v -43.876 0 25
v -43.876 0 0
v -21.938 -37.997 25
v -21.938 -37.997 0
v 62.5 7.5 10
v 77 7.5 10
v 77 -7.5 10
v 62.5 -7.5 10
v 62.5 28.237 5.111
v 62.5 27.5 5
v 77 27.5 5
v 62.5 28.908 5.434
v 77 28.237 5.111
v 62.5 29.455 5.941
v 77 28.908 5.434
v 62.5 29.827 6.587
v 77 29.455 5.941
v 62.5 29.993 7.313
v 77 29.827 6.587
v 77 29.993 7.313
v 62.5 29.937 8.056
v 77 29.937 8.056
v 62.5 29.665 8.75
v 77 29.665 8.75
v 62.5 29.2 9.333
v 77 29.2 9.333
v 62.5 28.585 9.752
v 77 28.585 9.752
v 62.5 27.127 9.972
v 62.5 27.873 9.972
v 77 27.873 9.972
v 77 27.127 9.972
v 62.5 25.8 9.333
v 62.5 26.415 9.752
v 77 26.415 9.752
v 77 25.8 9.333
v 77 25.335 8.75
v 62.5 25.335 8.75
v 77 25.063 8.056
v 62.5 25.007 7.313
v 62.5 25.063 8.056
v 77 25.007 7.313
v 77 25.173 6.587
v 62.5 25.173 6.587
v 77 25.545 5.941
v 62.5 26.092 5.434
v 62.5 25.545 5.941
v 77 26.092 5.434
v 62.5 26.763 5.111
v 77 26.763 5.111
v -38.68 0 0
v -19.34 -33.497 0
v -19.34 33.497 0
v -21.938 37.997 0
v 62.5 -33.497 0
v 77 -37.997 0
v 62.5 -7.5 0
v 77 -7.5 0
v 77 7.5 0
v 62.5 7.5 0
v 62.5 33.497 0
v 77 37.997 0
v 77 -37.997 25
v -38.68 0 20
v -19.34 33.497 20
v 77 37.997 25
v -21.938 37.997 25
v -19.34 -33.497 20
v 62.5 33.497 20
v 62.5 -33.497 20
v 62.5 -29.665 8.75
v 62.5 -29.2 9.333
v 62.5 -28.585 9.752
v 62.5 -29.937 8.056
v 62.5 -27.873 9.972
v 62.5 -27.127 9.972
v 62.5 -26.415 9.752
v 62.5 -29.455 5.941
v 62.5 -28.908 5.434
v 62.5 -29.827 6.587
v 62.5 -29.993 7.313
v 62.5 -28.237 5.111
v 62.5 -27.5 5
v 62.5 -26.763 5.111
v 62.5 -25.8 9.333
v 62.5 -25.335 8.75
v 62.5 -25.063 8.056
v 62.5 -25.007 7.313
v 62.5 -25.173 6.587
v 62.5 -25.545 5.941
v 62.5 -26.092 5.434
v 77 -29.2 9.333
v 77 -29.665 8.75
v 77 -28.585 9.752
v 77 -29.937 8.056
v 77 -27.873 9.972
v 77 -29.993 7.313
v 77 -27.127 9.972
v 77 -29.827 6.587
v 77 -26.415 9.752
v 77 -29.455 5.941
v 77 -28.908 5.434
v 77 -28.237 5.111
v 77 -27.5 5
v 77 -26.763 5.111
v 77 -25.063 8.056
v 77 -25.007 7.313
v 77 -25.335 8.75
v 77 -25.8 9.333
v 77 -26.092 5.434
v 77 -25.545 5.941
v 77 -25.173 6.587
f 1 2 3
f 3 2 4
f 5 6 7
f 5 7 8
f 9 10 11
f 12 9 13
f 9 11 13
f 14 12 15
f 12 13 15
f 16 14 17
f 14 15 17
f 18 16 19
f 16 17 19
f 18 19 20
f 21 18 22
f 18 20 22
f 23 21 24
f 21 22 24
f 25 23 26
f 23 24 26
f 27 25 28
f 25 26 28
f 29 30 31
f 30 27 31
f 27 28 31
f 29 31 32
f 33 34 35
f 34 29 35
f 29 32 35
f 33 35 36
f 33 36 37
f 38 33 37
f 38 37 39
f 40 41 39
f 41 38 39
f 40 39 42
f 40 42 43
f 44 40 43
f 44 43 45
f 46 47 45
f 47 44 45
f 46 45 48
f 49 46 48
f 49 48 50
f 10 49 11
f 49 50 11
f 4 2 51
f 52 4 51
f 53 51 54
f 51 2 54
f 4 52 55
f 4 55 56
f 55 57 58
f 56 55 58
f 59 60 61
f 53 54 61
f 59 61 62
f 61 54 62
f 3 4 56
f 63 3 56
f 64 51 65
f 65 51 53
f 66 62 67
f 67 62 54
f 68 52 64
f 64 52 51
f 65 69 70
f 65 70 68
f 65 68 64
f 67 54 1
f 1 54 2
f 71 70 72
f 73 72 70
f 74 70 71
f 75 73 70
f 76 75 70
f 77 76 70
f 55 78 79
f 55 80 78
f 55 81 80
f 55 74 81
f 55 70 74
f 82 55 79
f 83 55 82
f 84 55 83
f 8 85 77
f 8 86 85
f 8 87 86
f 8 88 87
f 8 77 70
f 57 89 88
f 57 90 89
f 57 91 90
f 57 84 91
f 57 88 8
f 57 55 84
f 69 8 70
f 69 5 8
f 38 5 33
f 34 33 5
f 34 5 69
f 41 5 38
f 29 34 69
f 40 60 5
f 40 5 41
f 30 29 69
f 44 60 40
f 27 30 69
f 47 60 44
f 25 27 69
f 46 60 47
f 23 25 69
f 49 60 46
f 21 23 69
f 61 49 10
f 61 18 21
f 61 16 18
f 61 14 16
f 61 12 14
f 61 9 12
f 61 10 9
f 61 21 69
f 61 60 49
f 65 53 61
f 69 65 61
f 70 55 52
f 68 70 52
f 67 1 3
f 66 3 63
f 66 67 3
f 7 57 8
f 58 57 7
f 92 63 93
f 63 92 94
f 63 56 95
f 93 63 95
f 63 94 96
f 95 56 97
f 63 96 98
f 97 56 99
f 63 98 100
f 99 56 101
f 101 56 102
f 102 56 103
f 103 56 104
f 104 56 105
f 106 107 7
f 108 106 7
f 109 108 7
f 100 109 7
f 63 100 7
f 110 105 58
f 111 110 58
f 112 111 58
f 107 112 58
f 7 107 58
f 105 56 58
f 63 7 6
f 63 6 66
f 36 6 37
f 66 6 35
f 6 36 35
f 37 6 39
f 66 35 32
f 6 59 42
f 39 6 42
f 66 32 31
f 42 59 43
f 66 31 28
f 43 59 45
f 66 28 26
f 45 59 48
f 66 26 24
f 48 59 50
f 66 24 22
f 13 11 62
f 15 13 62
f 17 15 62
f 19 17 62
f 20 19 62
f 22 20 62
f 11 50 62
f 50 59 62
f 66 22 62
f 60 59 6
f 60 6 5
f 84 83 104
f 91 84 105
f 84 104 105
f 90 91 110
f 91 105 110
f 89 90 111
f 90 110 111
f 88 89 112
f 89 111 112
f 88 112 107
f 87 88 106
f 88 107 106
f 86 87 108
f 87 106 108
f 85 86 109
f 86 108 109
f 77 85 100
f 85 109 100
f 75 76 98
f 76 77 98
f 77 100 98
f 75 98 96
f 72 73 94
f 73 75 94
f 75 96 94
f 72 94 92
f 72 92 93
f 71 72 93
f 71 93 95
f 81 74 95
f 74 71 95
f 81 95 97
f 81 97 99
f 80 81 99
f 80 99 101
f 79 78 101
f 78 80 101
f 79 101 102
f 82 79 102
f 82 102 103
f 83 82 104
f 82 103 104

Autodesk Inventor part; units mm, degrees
ref_plane "YZ Plane" through (0, 0, 0) normal (1, 0, 0) x (0, 1, 0)
ref_plane "XZ Plane" through (0, 0, 0) normal (0, 1, 0) x (-1, 0, 0)
ref_plane "XY Plane" through (0, 0, 0) normal (0, 0, 1) x (1, 0, 0)
sketch "Sketch1" plane through (0, 0, 0) normal (0, 0, 1) x (1, 0, 0)
  line L0 (44.453, 0) -> (22.2265, -38.4974)
  line L1 (22.2265, -38.4974) -> (-22.2265, -38.4974)
  line L2 (-22.2265, -38.4974) -> (-44.453, 0)
  line L3 (-44.453, 0) -> (-22.2265, 38.4974)
  line L4 (-22.2265, 38.4974) -> (22.2265, 38.4974)
  line L5 (22.2265, 38.4974) -> (44.453, 0)
  line L6 (22.2265, 38.4974) -> (77.5, 38.4974)
  line L7 (22.2265, -38.4974) -> (77.5, -38.4974)
  line L8 (77.5, -38.4974) -> (77.5, 38.4974)
  point P0 (0, 0)
  point P1 (0, 0)
  dimension "d1" = 99.7265
  dimension "d2" = 76.9948
extrude "Extrusion1" add sketch "Sketch1" along normal blind 15
sketch "Sketch2" plane through (77.5, -38.4974, 0) normal (1, 0, 0) x (0, 0, -1)
  circle A0 centre (-7.5, 65.9974) radius 2.5
  circle A1 centre (-7.5, 10.9974) radius 2.5
  line L0 (-7.5, 65.9974) -> (-7.5, 10.9974) construction
  line L1 (0, 0) -> (0, 76.9948) construction
  line L2 (0, 76.9948) -> (-15, 76.9948) construction
  point P0 (0, 38.4974)
  point P1 (-7.5, 38.4974)
  point P2 (0, 38.4974)
  point P3 (-7.5, 76.9948)
  dimension "d5" = 5
  dimension "d6" = 5
  dimension "d7" = 55
extrude "Extrusion2" cut sketch "Sketch2" against normal blind 25
sketch "Sketch3" plane through (0, 0, 0) normal (0, 0, -1) x (-1, 0, 0)
  line L0 (-77.5, -38.4974) -> (-77.5, 38.4974) projected
  line L1 (-77.5, 7.5) -> (-62.5, 7.5)
  line L2 (-62.5, 7.5) -> (-62.5, -7.5)
  line L3 (-62.5, -7.5) -> (-77.5, -7.5)
  line L4 (-77.5, -7.5) -> (-77.5, 7.5)
  line L5 (-77.5, 38.4974) -> (22.2265, 38.4974) projected
  line L6 (22.2265, 38.4974) -> (44.453, 0) projected
  line L7 (44.453, 0) -> (22.2265, -38.4974) projected
  line L8 (22.2265, -38.4974) -> (-77.5, -38.4974) projected
  line L9 (38.6795, 0) -> (19.3397, 33.4974)
  line L10 (19.3397, 33.4974) -> (-72.5, 33.4974)
  line L11 (-72.5, 33.4974) -> (-72.5, -33.4974) construction
  line L12 (-72.5, -33.4974) -> (19.3397, -33.4974)
  line L13 (19.3397, -33.4974) -> (38.6795, 0)
  line L14 (-62.5, 7.5) -> (-62.5, 33.4974)
  line L15 (-62.5, -7.5) -> (-62.5, -33.4974)
  line L16 (19.3397, 33.4974) -> (-62.5, 33.4974)
  line L17 (-62.5, -33.4974) -> (19.3397, -33.4974)
  point P0 (0, 0)
  point P1 (-77.5, 0)
  dimension "d10" = 15
  dimension "d11" = 15
  dimension "d12" = 5
extrude "Extrusion3" cut sketch "Sketch3" against normal blind 10 contours L0 L1 L2 L3 | L2 L14 L10 L9 L13 L12 L15
sketch "Sketch5" plane through (0, 0, 15) normal (0, 0, 1) x (1, 0, 0)
  line L0 (77.5, 38.4974) -> (-22.2265, 38.4974) projected
  line L1 (-22.2265, 38.4974) -> (-44.453, 0) projected
  line L2 (-44.453, 0) -> (-22.2265, -38.4974) projected
  line L3 (-22.2265, -38.4974) -> (77.5, -38.4974) projected
  line L4 (77.5, -38.4974) -> (77.5, 38.4974) projected
  line L5 (77, -37.9974) -> (-21.9378, -37.9974)
  line L6 (-21.9378, -37.9974) -> (-43.8756, 0)
  line L7 (-43.8756, 0) -> (-21.9378, 37.9974)
  line L8 (-21.9378, 37.9974) -> (77, 37.9974)
  line L9 (77, 37.9974) -> (77, -37.9974)
  point P0 (0, 0)
  dimension "d15" = 0.5
extrude "Extrusion4" cut sketch "Sketch5" against normal through all
sketch "Sketch6" plane through (0, 0, 15) normal (0, 0, 1) x (1, 0, 0)
  line L0 (77, -37.9974) -> (77, 37.9974) projected
  line L1 (77, 37.9974) -> (-21.9378, 37.9974) projected
  line L2 (-21.9378, 37.9974) -> (-43.8756, 0) projected
  line L3 (-43.8756, 0) -> (-21.9378, -37.9974) projected
  line L4 (-21.9378, -37.9974) -> (77, -37.9974) projected
  point P0 (0, 0)
extrude "Extrusion5" add sketch "Sketch6" along normal blind 10
sketch "Sketch7" plane through (0, 0, 10) normal (0, 0, -1) x (-1, 0, 0)
  line L0 (-77, 7.5) -> (-77, -7.5) projected
  line L1 (-62.5, -7.5) -> (-77, -7.5) projected
  line L2 (-62.5, -27.5) -> (-62.5, -7.5) projected
  line L3 (-62.5, -33.4974) -> (-62.5, -27.5) projected
  line L4 (19.3397, -33.4974) -> (-62.5, -33.4974) projected
  line L5 (38.6795, 0) -> (19.3397, -33.4974) projected
  line L6 (19.3397, 33.4974) -> (38.6795, 0) projected
  line L7 (-62.5, 33.4974) -> (19.3397, 33.4974) projected
  line L8 (-62.5, 27.5) -> (-62.5, 33.4974) projected
  line L9 (-62.5, 7.5) -> (-62.5, 27.5) projected
  line L10 (-77, 7.5) -> (-62.5, 7.5) projected
  line L11 (-62.5, 7.5) -> (-62.5, -7.5)
  point P0 (0, 0)
extrude "Extrusion6" cut sketch "Sketch7" against normal blind 10 contours L9 L8 L7 L6 L5 L4 L3 L2 L11
properties part number "TARM06" material "ABS Plastic"
